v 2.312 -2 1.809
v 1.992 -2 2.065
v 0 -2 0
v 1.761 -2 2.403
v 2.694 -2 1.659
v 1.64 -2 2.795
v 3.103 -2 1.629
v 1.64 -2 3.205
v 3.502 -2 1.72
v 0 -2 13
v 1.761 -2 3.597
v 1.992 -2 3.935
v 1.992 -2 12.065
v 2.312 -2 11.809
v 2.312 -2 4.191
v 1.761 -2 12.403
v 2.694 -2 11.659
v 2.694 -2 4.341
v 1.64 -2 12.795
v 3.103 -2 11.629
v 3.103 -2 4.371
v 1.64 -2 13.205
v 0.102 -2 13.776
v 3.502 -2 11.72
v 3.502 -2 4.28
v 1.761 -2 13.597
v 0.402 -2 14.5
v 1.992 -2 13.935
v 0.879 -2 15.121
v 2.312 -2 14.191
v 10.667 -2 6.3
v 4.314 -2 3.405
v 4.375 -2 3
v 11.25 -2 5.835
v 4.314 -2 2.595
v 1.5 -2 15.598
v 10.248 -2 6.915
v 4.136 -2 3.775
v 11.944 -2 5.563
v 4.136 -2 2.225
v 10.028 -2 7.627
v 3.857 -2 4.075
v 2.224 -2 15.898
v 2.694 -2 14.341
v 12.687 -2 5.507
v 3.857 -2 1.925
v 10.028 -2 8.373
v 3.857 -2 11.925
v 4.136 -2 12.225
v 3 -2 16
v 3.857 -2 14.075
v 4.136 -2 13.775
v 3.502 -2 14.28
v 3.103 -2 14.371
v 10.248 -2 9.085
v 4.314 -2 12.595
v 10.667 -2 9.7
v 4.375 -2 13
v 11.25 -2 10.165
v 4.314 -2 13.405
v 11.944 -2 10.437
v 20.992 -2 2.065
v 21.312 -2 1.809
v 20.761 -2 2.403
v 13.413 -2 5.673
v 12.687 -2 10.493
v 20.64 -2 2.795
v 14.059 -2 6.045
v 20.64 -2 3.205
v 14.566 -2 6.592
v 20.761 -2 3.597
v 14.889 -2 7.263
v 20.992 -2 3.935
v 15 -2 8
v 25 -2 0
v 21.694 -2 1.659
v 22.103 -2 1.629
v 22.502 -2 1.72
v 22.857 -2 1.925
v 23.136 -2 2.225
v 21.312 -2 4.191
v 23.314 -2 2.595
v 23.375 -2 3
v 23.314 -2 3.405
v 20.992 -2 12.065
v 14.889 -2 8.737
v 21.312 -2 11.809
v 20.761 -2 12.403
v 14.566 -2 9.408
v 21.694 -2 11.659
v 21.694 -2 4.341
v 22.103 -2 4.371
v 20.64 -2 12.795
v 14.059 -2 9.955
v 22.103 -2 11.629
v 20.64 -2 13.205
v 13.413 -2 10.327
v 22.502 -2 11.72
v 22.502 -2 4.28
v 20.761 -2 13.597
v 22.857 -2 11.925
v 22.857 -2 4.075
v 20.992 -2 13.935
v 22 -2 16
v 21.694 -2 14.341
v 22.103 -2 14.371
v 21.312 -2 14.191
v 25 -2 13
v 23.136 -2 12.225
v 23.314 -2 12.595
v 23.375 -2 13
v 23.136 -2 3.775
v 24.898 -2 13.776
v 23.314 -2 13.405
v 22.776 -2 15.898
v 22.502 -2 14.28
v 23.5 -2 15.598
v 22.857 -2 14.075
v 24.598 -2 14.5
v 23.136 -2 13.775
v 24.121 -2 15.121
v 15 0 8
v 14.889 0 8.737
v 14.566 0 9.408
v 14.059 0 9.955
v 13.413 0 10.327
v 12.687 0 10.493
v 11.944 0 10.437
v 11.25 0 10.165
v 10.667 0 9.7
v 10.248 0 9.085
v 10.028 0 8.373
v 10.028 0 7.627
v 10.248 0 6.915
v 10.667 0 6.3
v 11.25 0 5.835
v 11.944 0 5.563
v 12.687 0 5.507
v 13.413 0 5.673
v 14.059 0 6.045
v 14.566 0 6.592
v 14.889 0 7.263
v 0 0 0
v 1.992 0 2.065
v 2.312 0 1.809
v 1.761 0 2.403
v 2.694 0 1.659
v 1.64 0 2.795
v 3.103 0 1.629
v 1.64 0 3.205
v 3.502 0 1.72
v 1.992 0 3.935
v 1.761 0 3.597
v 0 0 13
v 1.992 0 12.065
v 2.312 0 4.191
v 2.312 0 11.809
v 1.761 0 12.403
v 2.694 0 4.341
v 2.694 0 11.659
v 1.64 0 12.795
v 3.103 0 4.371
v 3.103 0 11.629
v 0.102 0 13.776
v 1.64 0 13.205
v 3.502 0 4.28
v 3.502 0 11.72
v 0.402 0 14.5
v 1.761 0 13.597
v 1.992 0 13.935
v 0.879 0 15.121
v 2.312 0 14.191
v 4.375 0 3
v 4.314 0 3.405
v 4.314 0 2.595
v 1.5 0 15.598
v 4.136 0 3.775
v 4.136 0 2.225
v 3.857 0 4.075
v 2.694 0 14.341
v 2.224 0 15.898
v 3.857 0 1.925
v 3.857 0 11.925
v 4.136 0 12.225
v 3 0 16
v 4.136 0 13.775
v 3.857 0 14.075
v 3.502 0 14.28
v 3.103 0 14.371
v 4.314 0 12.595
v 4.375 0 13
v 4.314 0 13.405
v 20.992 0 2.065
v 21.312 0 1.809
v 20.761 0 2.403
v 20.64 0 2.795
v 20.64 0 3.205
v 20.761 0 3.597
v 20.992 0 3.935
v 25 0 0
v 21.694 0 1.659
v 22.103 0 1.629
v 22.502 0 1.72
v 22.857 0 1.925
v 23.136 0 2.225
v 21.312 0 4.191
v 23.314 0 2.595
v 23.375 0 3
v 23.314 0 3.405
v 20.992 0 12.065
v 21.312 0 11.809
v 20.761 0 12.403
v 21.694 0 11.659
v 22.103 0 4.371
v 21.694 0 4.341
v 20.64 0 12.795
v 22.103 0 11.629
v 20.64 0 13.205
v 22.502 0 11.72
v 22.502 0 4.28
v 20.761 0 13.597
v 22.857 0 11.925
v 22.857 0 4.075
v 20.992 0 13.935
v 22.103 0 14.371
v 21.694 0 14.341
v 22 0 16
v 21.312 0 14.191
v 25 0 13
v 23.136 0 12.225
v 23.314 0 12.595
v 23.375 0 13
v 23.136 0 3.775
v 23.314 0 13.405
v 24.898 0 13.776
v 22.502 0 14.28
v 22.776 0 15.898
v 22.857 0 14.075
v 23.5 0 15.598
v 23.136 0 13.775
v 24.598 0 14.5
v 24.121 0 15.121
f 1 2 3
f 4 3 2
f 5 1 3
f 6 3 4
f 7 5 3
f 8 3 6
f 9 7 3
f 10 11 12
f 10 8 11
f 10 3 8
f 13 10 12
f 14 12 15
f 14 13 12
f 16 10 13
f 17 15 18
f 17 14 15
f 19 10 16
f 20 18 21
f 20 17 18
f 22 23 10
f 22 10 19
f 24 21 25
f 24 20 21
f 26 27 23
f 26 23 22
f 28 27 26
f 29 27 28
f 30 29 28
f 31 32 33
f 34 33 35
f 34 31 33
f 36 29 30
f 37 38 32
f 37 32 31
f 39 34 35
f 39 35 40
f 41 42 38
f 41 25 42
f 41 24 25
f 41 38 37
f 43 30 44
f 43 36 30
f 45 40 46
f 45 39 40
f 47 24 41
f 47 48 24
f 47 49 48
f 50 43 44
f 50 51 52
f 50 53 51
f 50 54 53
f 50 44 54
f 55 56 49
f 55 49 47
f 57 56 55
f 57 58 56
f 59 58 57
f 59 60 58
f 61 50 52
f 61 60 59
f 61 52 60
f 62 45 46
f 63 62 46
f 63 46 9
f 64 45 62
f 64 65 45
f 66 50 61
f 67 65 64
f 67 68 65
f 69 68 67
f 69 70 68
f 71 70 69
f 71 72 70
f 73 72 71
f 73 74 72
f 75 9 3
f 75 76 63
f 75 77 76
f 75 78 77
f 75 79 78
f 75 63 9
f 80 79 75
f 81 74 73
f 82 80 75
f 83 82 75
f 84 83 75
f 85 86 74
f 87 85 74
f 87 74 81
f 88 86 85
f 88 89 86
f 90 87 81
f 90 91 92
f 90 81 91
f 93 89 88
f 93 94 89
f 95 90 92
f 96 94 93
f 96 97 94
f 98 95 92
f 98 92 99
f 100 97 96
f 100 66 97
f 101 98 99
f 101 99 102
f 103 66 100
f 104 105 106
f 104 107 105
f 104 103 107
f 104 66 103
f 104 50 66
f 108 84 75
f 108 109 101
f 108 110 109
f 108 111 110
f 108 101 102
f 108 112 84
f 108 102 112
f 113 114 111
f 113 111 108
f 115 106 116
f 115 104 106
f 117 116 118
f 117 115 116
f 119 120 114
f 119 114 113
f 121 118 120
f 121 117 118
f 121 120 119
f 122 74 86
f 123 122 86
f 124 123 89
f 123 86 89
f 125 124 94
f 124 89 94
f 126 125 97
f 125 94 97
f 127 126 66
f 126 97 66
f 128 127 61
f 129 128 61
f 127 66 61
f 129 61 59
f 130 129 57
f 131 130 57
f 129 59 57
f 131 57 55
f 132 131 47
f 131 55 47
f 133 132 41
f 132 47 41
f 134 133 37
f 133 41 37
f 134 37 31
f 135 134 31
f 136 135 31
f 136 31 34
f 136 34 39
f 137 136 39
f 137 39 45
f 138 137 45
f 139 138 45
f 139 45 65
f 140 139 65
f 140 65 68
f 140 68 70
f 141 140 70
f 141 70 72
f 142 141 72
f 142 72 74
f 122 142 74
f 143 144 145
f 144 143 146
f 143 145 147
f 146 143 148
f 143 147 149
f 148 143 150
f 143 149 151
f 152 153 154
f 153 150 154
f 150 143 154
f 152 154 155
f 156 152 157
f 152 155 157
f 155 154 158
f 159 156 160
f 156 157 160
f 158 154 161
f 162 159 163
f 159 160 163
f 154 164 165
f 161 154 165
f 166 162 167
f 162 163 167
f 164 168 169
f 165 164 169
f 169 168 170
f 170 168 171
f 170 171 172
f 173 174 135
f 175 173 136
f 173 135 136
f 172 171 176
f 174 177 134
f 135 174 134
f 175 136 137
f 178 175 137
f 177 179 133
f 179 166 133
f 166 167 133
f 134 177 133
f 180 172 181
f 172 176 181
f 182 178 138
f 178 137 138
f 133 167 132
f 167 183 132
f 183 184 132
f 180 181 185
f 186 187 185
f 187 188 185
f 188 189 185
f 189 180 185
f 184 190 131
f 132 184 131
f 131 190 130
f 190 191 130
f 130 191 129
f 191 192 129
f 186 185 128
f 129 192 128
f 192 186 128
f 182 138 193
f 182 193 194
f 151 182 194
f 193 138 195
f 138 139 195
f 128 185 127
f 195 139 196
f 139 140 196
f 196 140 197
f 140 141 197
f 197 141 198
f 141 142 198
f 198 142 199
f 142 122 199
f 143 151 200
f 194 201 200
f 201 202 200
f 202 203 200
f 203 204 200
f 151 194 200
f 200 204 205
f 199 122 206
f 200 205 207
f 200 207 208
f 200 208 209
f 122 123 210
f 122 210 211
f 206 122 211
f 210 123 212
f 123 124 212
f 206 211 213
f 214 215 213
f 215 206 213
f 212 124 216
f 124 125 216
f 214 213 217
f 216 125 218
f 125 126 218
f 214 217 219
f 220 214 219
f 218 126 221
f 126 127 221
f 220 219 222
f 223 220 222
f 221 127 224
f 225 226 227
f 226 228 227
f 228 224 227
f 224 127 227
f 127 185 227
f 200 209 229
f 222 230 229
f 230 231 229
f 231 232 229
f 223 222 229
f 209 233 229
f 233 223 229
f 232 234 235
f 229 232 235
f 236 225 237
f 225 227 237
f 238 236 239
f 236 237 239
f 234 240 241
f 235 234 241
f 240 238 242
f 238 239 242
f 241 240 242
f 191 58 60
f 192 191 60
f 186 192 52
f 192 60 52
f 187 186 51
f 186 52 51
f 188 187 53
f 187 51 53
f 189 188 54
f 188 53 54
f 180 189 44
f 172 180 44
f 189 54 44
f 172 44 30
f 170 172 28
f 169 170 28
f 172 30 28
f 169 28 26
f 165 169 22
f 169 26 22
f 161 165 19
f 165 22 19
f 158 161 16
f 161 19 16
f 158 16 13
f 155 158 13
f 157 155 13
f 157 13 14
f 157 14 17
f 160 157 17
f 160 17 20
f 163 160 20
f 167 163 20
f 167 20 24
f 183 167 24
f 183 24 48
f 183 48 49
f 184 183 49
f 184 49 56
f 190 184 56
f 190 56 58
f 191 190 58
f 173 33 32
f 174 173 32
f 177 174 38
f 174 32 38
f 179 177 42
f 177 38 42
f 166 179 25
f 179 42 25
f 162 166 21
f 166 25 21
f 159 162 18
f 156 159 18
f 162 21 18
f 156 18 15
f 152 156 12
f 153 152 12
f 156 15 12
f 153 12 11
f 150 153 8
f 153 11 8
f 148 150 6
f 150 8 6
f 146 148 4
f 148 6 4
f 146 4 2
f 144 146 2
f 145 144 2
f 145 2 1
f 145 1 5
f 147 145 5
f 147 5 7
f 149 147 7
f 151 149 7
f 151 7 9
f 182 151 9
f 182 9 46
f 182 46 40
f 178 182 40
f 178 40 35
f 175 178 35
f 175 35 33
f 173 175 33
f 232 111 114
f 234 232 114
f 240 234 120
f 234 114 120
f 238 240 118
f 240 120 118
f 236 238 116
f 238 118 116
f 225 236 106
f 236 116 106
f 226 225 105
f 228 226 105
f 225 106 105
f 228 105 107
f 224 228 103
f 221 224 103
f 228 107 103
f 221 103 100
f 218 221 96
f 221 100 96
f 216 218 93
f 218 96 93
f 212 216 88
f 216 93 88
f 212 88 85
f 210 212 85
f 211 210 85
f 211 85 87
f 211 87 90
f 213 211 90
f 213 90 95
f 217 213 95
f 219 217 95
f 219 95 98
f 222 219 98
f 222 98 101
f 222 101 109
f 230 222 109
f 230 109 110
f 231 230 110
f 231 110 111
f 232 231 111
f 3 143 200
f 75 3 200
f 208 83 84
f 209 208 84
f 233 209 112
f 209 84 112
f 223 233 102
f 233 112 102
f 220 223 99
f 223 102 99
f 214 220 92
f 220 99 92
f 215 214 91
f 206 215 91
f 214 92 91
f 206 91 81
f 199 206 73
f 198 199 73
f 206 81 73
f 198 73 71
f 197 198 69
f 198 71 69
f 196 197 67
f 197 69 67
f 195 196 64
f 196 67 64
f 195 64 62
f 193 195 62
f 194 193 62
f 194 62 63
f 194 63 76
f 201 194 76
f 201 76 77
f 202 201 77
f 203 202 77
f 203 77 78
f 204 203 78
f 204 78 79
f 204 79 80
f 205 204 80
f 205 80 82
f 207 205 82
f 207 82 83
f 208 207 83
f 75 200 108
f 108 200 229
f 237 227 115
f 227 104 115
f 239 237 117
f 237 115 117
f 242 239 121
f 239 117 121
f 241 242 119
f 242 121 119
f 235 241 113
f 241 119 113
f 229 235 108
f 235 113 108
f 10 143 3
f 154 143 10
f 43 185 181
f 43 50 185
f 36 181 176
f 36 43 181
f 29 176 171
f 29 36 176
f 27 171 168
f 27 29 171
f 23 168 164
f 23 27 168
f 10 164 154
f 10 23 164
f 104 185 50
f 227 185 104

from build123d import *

# Parameters (mm, degrees)
F0_W      = 25
F0_H      = 16
F1_DEPTH  = 2
F2_R      = 1.375
F6_DEPTH  = 3
F3_R      = 1.375
F7_DEPTH  = 3
F4_R      = 1.375
F8_DEPTH  = 3
F5_R      = 1.375
F9_DEPTH  = 3
F10_R     = 3
F11_R     = 3
F12_R     = 2.5
F13_DEPTH = 3


with BuildPart() as f1:
    # F0 (on Front) → F1 (new body)
    with BuildSketch(Plane.XZ):
        with Locations((12.5, 8)):
            Rectangle(F0_W, F0_H)
    extrude(amount=F1_DEPTH)

    # F2 (on face) → F6 (cut)
    with BuildSketch(Plane.XZ.offset(2)):
        with Locations((3, 13)):
            Circle(F2_R)
    extrude(amount=-F6_DEPTH, mode=Mode.SUBTRACT)

    # F3 (on face) → F7 (cut)
    with BuildSketch(Plane.XZ.offset(2)):
        with Locations((3, 3)):
            Circle(F3_R)
    extrude(amount=-F7_DEPTH, mode=Mode.SUBTRACT)

    # F4 (on face) → F8 (cut)
    with BuildSketch(Plane.XZ.offset(2)):
        with Locations((22, 13)):
            Circle(F4_R)
    extrude(amount=-F8_DEPTH, mode=Mode.SUBTRACT)

    # F5 (on face) → F9 (cut)
    with BuildSketch(Plane.XZ.offset(2)):
        with Locations((22, 3)):
            Circle(F5_R)
    extrude(amount=-F9_DEPTH, mode=Mode.SUBTRACT)

    # F10
    f10_edges = [f1.edges().sort_by_distance(p)[0] for p in [
        (25, -1, 16),
    ]]
    fillet(f10_edges, radius=F10_R)

    # F11
    f11_edges = [f1.edges().sort_by_distance(p)[0] for p in [
        (0, -1, 16),
    ]]
    fillet(f11_edges, radius=F11_R)

    # F12 (on face) → F13 (cut)
    with BuildSketch(Plane.XZ.offset(2)):
        with Locations((12.5, 8)):
            Circle(F12_R)
    extrude(amount=-F13_DEPTH, mode=Mode.SUBTRACT)


solid = f1.part
